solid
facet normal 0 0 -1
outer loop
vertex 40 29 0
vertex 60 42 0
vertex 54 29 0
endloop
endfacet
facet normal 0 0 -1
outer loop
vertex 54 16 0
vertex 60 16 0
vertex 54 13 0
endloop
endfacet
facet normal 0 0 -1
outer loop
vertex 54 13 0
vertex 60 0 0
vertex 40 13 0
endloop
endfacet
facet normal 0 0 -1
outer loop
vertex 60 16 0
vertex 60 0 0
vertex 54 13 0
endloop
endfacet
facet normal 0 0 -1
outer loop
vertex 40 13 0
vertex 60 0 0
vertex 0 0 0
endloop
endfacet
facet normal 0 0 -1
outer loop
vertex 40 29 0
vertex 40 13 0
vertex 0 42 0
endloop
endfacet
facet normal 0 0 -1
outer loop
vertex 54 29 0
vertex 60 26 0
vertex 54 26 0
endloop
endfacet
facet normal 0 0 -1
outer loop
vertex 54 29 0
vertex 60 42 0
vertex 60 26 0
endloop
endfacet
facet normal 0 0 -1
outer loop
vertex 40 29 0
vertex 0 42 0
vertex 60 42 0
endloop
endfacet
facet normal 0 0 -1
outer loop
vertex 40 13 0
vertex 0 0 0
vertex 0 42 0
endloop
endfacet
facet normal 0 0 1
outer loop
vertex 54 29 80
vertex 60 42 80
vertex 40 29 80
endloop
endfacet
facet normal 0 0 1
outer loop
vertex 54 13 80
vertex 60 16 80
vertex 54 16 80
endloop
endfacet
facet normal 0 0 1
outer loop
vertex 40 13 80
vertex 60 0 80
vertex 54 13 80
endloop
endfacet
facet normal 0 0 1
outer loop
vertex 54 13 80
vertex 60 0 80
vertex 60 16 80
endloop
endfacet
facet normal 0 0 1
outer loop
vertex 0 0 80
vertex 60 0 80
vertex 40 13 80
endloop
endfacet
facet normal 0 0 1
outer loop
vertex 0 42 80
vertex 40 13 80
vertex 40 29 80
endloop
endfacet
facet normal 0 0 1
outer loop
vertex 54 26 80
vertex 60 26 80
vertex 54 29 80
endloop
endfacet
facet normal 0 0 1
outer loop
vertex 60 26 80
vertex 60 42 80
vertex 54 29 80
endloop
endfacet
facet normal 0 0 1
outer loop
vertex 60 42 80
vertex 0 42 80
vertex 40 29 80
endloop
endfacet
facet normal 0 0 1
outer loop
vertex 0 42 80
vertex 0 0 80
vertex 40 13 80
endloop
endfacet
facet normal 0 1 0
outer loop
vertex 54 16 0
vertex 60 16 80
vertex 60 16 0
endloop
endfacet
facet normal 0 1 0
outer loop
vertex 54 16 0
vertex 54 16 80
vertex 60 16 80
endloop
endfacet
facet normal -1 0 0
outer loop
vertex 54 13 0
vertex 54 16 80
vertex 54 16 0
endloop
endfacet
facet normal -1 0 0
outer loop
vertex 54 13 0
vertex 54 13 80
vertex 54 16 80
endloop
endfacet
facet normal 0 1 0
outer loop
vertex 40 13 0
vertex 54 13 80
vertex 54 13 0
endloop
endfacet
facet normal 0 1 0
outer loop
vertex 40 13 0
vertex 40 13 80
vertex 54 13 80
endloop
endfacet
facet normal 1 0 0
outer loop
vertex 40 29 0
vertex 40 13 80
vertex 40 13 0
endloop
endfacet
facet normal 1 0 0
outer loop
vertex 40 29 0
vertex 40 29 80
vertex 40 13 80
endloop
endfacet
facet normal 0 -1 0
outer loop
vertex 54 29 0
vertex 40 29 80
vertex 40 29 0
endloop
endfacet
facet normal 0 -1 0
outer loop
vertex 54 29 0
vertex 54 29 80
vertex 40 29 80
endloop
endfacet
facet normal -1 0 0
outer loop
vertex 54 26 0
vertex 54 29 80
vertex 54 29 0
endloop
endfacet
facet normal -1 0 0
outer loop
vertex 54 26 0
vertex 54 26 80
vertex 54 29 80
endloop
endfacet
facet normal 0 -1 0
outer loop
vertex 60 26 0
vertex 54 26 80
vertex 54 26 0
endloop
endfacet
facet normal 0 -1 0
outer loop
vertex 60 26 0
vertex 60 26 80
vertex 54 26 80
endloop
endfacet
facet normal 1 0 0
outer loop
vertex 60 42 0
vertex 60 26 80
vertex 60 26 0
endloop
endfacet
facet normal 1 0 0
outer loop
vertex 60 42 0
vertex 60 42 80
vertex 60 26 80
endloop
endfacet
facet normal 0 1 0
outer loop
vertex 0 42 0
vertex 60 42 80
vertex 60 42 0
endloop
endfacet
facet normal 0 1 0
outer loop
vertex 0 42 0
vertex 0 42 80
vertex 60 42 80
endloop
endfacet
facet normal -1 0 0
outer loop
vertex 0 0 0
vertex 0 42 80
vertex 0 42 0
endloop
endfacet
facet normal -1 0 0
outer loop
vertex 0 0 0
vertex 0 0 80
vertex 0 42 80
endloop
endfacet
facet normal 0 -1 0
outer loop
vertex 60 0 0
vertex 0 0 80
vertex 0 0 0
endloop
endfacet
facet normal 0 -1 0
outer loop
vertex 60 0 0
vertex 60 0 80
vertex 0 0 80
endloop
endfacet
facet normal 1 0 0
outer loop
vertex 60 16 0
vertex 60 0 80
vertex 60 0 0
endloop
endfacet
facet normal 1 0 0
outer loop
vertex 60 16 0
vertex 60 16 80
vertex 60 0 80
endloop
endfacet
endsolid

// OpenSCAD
$fn = 32;

// ----------------------------------------------------------------------
// T-slot rail: 60 x 42 mm section, 80 mm long
// ----------------------------------------------------------------------

// --- parameters (mm) ---
profile_height = 80;      // extrusion height
profile_points = 12;      // points of the closed outline

profile = [[0, 0], [60, 0], [60, 16], [54, 16], [54, 13], [40, 13], [40, 29], [54, 29], [54, 26], [60, 26], [60, 42], [0, 42]];  // single closed polygon, 12 points, counter clockwise

// --- the one profile operation ---
linear_extrude(height = profile_height) polygon(points = profile);
